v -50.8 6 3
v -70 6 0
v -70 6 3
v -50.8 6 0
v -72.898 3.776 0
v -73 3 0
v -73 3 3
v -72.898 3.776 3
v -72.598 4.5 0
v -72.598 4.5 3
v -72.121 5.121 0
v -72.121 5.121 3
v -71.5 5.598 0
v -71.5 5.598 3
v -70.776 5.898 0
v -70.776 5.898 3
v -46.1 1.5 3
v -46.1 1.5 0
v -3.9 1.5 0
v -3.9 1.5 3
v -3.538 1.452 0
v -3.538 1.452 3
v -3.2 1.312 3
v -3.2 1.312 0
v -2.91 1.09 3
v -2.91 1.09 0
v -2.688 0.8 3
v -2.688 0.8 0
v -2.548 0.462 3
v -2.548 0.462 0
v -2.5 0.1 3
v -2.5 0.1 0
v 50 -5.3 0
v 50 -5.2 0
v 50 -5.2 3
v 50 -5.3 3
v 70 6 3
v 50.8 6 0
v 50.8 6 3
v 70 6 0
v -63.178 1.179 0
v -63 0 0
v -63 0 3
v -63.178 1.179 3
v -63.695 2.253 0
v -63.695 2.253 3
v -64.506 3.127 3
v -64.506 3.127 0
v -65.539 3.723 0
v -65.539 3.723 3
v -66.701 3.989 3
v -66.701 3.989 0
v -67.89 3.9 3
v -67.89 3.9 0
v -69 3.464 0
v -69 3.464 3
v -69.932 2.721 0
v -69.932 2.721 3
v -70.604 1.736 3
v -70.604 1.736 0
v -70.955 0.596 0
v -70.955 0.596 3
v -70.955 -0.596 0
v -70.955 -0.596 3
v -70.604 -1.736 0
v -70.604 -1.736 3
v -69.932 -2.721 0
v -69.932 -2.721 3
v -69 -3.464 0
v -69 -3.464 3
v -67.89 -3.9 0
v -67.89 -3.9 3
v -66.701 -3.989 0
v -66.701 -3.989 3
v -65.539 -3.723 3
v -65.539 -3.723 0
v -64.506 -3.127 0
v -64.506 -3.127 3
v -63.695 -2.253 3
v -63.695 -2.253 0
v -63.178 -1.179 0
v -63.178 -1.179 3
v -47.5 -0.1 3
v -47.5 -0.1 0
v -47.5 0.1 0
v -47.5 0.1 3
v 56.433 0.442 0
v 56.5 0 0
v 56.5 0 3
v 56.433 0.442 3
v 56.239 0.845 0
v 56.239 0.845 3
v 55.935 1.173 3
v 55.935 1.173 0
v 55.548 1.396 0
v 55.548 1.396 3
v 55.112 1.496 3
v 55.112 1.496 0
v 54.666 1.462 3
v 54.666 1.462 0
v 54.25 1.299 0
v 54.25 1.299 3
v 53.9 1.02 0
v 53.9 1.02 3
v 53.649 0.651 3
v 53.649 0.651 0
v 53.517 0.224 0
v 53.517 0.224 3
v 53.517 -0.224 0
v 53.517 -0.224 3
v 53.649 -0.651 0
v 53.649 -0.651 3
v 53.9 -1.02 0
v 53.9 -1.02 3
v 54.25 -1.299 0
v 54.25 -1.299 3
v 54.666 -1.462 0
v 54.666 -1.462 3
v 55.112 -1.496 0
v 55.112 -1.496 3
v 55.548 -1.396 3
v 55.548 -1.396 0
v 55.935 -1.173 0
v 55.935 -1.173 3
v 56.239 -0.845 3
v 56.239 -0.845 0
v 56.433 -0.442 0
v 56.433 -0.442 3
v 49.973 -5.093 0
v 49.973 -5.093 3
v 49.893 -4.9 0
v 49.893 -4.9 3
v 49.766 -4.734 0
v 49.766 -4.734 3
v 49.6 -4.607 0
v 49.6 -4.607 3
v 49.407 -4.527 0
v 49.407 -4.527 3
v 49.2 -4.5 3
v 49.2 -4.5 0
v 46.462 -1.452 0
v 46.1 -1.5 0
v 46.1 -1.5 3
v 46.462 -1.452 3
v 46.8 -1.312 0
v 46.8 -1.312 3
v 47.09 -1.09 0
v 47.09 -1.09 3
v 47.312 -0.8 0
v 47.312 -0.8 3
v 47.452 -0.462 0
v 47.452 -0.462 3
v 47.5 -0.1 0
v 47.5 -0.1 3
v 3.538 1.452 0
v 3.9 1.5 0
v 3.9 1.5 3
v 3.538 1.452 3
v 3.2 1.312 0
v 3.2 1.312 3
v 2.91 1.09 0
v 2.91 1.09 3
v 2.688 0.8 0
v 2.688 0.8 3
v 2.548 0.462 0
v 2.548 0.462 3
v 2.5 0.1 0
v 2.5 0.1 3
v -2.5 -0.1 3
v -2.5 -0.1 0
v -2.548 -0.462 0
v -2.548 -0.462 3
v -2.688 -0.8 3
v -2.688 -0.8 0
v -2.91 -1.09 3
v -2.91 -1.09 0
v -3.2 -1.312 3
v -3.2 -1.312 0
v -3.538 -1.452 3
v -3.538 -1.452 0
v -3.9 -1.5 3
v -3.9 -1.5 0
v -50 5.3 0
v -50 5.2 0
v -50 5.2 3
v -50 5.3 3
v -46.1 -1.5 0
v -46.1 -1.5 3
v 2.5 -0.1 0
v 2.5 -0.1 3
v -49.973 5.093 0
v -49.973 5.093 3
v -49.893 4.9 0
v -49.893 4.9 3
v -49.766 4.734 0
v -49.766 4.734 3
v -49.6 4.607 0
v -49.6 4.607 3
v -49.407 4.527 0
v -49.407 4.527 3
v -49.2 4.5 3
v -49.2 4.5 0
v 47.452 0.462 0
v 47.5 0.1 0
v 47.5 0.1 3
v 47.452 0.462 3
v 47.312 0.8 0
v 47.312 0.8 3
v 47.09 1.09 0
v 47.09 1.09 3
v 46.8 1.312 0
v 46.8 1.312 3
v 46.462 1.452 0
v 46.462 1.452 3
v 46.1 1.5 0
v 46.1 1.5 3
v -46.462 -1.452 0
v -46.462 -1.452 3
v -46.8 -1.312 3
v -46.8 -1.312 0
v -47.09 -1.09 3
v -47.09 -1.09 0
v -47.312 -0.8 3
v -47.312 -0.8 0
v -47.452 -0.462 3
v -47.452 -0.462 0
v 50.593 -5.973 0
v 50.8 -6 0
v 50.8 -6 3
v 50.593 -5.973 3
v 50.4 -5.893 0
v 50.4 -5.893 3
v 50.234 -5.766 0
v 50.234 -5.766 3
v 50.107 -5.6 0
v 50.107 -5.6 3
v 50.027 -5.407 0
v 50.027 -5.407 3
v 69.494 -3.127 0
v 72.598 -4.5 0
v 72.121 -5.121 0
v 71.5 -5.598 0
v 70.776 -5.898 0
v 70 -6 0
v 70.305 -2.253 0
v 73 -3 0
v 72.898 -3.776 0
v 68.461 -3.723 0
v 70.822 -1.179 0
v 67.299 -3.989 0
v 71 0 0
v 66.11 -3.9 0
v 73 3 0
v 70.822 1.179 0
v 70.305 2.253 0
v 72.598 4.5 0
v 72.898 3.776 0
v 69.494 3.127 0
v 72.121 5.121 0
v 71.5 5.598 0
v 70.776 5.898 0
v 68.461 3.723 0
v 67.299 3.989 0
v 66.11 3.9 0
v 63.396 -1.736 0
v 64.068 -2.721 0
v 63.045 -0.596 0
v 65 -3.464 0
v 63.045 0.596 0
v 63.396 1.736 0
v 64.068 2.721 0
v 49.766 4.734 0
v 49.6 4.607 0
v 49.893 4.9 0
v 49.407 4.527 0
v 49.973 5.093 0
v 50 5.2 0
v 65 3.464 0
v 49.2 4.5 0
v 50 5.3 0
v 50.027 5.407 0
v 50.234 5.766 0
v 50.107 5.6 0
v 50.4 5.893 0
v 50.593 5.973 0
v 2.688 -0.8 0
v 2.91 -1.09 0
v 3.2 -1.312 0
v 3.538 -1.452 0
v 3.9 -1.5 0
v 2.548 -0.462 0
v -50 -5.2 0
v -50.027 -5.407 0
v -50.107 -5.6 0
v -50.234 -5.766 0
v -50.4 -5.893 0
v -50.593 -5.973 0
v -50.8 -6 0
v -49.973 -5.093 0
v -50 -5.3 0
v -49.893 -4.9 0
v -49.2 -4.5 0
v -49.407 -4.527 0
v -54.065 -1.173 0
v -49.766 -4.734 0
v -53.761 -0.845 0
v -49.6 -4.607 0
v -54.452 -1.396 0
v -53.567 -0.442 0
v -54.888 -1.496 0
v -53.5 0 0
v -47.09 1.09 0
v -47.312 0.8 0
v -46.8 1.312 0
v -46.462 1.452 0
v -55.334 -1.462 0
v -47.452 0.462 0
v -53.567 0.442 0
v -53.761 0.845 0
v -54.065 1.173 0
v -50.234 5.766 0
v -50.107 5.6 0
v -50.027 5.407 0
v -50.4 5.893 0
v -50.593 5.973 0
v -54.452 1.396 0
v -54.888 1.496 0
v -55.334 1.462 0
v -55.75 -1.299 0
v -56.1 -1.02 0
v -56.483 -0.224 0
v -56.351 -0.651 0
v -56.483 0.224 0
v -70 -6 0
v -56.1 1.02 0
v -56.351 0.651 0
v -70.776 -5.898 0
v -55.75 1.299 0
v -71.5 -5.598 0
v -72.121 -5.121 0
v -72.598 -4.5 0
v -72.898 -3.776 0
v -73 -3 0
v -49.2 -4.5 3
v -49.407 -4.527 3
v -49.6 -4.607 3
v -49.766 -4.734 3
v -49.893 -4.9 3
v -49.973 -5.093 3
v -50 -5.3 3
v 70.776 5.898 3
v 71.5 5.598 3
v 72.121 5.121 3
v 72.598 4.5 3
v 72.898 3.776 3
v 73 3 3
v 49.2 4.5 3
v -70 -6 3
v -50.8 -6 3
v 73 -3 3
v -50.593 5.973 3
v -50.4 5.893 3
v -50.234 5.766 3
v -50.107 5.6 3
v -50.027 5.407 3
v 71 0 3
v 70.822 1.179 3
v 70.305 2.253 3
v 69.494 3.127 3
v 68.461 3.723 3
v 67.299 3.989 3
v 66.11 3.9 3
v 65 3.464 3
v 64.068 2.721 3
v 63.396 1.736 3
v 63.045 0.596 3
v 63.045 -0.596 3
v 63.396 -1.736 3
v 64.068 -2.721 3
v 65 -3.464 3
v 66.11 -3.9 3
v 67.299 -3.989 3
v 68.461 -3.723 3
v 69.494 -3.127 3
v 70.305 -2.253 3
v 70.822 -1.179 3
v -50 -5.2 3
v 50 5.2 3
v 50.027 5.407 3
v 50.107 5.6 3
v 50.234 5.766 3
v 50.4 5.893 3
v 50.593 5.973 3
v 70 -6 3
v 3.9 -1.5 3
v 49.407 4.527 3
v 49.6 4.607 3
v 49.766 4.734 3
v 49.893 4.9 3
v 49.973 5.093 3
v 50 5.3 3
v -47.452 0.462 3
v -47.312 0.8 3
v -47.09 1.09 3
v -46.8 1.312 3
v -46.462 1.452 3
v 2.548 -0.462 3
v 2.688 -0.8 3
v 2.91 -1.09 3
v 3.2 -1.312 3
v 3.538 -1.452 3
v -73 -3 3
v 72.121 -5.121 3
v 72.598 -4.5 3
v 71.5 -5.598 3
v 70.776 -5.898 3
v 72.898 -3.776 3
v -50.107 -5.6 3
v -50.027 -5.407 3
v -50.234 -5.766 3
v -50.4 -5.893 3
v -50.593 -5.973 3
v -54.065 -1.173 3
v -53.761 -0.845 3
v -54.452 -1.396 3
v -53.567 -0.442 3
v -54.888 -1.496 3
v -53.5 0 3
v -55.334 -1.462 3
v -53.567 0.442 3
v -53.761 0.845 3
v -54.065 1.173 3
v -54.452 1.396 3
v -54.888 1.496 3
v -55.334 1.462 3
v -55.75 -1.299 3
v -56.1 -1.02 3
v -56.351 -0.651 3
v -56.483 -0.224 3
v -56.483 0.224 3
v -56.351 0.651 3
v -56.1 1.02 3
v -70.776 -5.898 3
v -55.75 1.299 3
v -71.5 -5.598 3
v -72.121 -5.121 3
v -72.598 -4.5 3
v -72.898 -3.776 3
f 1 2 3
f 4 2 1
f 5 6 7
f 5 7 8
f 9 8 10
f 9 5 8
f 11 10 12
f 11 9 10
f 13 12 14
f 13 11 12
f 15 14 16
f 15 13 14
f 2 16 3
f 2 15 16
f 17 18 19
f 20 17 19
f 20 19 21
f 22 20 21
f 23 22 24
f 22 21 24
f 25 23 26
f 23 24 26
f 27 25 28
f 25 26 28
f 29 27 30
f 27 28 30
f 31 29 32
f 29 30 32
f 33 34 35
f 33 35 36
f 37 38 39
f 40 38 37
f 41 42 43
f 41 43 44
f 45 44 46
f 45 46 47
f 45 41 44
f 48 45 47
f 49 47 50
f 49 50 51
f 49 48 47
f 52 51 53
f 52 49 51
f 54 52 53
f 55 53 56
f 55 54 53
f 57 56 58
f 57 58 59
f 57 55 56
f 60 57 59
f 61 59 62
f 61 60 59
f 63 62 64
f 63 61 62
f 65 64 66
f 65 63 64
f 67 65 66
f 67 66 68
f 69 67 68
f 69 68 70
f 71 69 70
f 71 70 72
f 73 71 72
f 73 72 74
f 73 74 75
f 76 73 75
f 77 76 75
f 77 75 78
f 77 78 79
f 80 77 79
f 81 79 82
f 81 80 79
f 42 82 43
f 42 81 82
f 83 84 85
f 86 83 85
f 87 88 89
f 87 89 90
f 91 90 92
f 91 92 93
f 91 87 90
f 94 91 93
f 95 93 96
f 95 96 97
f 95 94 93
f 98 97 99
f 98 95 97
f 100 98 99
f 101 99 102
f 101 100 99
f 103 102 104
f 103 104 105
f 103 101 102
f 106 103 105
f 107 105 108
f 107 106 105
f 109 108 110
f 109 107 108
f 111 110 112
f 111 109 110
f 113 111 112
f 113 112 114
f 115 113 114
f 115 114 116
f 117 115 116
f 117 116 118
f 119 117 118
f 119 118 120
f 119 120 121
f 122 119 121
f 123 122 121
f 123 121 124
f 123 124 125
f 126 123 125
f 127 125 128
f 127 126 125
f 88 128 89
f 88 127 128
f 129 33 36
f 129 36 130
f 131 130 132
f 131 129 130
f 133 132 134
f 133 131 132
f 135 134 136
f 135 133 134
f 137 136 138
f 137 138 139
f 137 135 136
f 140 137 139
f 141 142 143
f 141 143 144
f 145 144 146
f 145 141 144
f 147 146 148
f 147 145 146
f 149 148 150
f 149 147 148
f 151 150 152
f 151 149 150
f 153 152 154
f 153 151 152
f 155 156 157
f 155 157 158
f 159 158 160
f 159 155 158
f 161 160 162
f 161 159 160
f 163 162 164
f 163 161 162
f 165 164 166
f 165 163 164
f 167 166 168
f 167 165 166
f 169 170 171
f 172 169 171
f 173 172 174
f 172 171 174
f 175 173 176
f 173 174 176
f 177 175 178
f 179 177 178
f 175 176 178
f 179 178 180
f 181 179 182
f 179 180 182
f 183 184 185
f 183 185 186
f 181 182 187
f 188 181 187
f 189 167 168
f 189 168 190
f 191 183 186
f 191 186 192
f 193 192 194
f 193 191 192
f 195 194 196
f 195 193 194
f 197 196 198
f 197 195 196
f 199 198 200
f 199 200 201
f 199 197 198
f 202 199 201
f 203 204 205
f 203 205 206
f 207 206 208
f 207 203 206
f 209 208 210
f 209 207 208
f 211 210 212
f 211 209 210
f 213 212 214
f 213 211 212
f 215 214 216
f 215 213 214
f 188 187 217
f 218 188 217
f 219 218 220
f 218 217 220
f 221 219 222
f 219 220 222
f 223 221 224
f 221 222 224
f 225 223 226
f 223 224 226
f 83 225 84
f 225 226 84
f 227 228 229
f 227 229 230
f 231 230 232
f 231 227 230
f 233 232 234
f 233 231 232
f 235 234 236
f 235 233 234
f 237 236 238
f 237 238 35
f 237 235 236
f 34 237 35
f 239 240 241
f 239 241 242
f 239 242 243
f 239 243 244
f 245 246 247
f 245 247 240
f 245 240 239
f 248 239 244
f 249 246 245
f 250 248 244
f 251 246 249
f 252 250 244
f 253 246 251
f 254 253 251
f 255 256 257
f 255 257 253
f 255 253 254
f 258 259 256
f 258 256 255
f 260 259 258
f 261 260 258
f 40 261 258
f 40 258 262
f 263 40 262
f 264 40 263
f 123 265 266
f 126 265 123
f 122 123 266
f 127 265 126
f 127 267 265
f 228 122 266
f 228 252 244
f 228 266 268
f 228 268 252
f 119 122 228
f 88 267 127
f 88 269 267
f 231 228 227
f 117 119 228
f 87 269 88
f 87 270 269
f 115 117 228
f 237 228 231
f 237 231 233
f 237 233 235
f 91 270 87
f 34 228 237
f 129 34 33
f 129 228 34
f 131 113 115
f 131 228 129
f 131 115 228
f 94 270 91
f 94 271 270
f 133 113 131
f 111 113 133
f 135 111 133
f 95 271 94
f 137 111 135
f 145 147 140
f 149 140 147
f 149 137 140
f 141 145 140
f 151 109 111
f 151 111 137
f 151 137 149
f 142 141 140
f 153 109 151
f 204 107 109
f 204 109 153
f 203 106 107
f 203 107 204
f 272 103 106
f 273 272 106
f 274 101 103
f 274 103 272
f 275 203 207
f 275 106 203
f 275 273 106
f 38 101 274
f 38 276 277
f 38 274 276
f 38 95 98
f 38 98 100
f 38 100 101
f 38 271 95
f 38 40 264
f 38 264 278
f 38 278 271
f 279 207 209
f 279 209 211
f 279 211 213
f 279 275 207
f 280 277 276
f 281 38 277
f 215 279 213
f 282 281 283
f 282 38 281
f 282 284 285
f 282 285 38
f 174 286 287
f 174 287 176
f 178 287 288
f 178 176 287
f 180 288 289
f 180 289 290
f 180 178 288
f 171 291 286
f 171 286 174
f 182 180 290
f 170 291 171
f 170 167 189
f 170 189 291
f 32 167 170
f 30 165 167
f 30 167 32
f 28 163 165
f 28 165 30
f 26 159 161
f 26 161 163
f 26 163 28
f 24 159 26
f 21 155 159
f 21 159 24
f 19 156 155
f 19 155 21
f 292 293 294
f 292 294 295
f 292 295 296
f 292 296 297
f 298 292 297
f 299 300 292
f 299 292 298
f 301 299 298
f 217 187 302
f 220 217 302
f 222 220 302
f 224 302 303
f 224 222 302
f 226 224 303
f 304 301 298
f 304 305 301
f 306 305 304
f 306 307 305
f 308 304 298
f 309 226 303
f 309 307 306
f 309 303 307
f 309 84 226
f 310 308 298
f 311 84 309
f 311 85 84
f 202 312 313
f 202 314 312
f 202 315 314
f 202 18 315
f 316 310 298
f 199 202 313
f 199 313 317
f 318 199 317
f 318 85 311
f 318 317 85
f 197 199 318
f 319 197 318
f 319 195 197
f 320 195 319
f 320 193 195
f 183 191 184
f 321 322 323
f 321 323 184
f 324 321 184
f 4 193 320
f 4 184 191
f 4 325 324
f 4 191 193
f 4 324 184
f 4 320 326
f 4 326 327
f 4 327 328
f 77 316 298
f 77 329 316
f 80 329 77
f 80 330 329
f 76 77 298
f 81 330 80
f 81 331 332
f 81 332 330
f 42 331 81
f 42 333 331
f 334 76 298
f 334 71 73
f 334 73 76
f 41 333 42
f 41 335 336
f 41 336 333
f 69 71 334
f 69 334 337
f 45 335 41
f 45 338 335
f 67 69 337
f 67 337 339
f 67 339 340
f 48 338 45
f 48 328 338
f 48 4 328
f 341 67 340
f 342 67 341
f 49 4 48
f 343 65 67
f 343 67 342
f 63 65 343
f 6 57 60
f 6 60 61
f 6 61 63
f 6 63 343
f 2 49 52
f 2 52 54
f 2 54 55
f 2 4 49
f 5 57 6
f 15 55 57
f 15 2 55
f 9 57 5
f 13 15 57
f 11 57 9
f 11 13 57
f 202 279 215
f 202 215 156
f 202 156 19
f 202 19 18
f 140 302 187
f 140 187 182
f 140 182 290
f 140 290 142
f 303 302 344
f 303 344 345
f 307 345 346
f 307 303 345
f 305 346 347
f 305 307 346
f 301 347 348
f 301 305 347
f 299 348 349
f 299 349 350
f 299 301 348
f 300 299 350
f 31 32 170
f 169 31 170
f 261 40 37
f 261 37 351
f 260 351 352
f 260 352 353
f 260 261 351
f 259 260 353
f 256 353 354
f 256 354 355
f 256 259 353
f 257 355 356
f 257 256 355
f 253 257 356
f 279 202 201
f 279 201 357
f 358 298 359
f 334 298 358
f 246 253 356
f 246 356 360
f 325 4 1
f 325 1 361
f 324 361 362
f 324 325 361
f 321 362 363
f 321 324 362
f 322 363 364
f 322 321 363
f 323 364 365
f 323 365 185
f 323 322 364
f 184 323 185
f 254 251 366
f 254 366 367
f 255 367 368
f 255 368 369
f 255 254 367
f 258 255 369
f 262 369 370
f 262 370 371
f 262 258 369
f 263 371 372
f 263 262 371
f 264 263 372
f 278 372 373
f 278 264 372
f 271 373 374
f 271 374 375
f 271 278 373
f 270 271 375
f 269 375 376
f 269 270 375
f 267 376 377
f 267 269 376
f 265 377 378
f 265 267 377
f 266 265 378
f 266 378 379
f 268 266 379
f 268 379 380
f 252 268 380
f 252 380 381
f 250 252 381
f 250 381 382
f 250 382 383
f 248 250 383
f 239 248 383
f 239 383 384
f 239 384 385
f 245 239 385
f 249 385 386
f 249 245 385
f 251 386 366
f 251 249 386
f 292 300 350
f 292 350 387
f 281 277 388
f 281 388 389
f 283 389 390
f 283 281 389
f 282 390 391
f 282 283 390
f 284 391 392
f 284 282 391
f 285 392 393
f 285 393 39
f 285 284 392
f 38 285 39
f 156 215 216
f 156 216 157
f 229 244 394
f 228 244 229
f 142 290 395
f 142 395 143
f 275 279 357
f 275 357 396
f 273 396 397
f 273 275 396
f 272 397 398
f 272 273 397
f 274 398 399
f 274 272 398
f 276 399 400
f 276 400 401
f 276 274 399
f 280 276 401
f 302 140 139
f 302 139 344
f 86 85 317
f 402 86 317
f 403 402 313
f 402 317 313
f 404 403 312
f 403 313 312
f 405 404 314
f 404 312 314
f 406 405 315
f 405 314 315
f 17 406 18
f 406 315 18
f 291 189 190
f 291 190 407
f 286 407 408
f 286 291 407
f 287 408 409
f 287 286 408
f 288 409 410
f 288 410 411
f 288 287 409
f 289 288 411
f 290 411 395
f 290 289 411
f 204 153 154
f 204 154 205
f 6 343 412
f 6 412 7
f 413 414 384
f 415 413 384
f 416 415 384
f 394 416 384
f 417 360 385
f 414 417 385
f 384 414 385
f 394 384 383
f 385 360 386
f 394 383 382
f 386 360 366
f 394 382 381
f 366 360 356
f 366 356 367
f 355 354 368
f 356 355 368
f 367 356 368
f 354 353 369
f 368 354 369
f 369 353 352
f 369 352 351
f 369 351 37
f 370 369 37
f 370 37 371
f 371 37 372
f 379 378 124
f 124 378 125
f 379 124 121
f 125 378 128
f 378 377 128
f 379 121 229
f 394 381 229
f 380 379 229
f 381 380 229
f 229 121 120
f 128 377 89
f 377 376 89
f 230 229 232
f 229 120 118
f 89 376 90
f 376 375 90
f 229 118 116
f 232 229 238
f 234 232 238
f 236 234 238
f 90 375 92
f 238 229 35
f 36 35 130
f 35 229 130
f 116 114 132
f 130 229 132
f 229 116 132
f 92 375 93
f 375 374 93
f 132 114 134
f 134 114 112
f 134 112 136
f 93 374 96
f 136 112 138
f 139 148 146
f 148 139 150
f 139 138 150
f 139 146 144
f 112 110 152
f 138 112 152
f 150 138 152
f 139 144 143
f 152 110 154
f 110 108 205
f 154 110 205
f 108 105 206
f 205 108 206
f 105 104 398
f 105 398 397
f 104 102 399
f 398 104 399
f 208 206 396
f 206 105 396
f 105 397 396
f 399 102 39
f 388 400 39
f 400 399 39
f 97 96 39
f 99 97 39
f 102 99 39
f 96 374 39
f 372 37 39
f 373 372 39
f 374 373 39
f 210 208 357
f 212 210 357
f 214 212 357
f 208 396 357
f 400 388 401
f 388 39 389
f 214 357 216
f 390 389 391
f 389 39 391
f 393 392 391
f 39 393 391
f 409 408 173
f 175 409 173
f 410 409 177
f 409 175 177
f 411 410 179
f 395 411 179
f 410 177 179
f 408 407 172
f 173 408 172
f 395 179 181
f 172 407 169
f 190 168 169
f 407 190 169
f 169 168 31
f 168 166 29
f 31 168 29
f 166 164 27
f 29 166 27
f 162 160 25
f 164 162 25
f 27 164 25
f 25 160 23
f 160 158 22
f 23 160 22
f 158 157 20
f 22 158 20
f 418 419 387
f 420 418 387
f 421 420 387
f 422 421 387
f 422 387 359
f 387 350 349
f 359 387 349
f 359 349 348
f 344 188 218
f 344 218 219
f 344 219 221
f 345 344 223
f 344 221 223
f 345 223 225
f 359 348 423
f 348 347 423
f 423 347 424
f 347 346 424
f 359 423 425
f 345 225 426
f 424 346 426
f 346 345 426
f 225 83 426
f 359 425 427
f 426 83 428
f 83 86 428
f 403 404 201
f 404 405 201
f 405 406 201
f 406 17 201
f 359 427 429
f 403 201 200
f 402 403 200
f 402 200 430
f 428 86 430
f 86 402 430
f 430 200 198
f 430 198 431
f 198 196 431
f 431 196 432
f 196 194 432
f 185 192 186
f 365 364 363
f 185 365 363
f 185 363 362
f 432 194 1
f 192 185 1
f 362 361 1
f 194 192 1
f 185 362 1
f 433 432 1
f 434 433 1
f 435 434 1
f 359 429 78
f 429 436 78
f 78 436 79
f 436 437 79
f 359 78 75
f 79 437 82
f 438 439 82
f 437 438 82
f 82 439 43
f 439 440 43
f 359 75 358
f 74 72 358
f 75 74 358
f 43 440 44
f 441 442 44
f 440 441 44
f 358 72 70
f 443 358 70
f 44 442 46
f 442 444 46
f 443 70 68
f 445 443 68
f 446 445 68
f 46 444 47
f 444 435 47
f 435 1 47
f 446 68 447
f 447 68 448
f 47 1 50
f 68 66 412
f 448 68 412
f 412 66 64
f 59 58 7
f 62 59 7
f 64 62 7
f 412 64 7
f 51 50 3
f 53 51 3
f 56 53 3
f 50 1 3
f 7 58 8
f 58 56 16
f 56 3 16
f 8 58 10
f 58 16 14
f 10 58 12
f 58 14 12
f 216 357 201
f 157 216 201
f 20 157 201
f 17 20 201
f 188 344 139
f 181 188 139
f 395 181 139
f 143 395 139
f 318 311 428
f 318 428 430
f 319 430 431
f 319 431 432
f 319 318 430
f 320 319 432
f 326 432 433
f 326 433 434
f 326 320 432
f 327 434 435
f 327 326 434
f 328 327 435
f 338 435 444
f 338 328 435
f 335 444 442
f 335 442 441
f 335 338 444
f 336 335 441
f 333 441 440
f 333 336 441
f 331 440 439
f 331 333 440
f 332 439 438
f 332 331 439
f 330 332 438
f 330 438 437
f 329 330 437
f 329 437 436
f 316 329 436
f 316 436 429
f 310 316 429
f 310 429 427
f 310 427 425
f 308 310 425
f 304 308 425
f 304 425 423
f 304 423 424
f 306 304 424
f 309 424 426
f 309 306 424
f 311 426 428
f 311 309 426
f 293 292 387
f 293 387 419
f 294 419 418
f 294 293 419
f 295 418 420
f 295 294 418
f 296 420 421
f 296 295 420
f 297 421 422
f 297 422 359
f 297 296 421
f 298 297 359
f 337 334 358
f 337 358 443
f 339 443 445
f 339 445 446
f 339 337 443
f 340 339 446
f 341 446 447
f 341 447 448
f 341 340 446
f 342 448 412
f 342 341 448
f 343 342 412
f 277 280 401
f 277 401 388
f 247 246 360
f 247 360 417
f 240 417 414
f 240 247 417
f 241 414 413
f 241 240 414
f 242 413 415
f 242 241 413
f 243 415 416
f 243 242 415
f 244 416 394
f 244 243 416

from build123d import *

# Parameters (mm, degrees)
SKETCH1_R           = 1.5
SKETCH1_R_2         = 4
BOSS_EXTRUDE1_DEPTH = 3


with BuildPart() as part:
    # Sketch1 → Boss-Extrude1 (new body)
    with BuildSketch(Plane.XY):
        with BuildLine():
            Line((-49.2, 4.5), (49.2, 4.5))
            ThreePointArc((49.2, 4.5), (49.765685425, 4.734314575), (50, 5.3))
            Line((50, 5.3), (50, 5.2))
            ThreePointArc((50, 5.2), (50.234314575, 5.765685425), (50.8, 6))
            Line((50.8, 6), (70, 6))
            ThreePointArc((70, 6), (72.121320344, 5.121320344), (73, 3))
            Line((73, 3), (73, -3))
            ThreePointArc((73, -3), (72.121320344, -5.121320344), (70, -6))
            Line((70, -6), (50.8, -6))
            ThreePointArc((50.8, -6), (50.234314575, -5.765685425), (50, -5.2))
            Line((50, -5.2), (50, -5.3))
            ThreePointArc((50, -5.3), (49.765685425, -4.734314575), (49.2, -4.5))
            Line((49.2, -4.5), (-49.2, -4.5))
            ThreePointArc((-49.2, -4.5), (-49.765685425, -4.734314575), (-50, -5.3))
            Line((-50, -5.3), (-50, -5.2))
            ThreePointArc((-50, -5.2), (-50.234314575, -5.765685425), (-50.8, -6))
            Line((-50.8, -6), (-70, -6))
            ThreePointArc((-70, -6), (-72.121320344, -5.121320344), (-73, -3))
            Line((-73, -3), (-73, 3))
            ThreePointArc((-73, 3), (-72.121320344, 5.121320344), (-70, 6))
            Line((-70, 6), (-50.8, 6))
            ThreePointArc((-50.8, 6), (-50.234314575, 5.765685425), (-50, 5.2))
            Line((-50, 5.2), (-50, 5.3))
            ThreePointArc((-50, 5.3), (-49.765685425, 4.734314575), (-49.2, 4.5))
        make_face()
        with Locations((-55, 0)):
            Circle(SKETCH1_R, mode=Mode.SUBTRACT)
        with Locations((-67, 0)):
            Circle(SKETCH1_R_2, mode=Mode.SUBTRACT)
        with Locations((67, 0)):
            Circle(SKETCH1_R_2, mode=Mode.SUBTRACT)
        with Locations((55, 0)):
            Circle(SKETCH1_R, mode=Mode.SUBTRACT)
        with BuildLine():
            Line((-46.1, 1.5), (-3.9, 1.5))
            ThreePointArc((-3.9, 1.5), (-2.910050506, 1.089949494), (-2.5, 0.1))
            Line((-2.5, 0.1), (-2.5, -0.1))
            ThreePointArc((-2.5, -0.1), (-2.910050506, -1.089949494), (-3.9, -1.5))
            Line((-3.9, -1.5), (-46.1, -1.5))
            ThreePointArc((-46.1, -1.5), (-47.089949494, -1.089949494), (-47.5, -0.1))
            Line((-47.5, -0.1), (-47.5, 0.1))
            ThreePointArc((-47.5, 0.1), (-47.089949494, 1.089949494), (-46.1, 1.5))
        make_face(mode=Mode.SUBTRACT)
        with BuildLine():
            Line((46.1, 1.5), (3.9, 1.5))
            ThreePointArc((3.9, 1.5), (2.910050506, 1.089949494), (2.5, 0.1))
            Line((2.5, 0.1), (2.5, -0.1))
            ThreePointArc((2.5, -0.1), (2.910050506, -1.089949494), (3.9, -1.5))
            Line((3.9, -1.5), (46.1, -1.5))
            ThreePointArc((46.1, -1.5), (47.089949494, -1.089949494), (47.5, -0.1))
            Line((47.5, -0.1), (47.5, 0.1))
            ThreePointArc((47.5, 0.1), (47.089949494, 1.089949494), (46.1, 1.5))
        make_face(mode=Mode.SUBTRACT)
    extrude(amount=BOSS_EXTRUDE1_DEPTH)


solid = part.part
